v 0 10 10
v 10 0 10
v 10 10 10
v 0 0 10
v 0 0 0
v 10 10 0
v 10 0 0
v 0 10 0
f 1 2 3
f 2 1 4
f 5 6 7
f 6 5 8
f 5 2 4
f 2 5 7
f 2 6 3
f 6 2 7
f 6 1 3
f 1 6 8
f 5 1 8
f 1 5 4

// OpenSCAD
// The same 2D-operand shape as `bool_2d_operand_difference`, on a `union`.
//
// ⚠ IT IS A SEPARATE CASE BECAUSE IT IS A SEPARATE CODE PATH IN OPENSCAD, not
// because two examples read better. `union` filters empty operands out before
// the boolean runs (`GeometryEvaluator.cc:175-181`) while `difference` carries
// the empty into `manifold-applyops.cc` and `continue`s past it. The two arrive
// at the same answer by different routes, and a regression in one of them is
// invisible in a corpus that only exercises the other. `mesh.ts` collapses both
// into `op !== 'intersection'`; that collapse is a claim, and this is the case
// that holds it up.
//
// MEASURED, `openscad 2026.08.07 --export-format asciistl`, this exact file:
// exit 0, the plain cube. ⚠ TWO DIFFERENT FACET COUNTS ARE BOTH CORRECT and it
// is worth naming which is which, because the harness prints one and the console
// prints the other: the console reports **6** (a convex PolySet, quads) and the
// ASCII STL carries **12** (triangles). We refuse the whole node and draw
// nothing ⇒ `STRICTER`.
//
// No control solid, for the reason written out in `bool_2d_operand_difference`.
union() {
  cube([10, 10, 10]);
  circle(r = 3);
}
